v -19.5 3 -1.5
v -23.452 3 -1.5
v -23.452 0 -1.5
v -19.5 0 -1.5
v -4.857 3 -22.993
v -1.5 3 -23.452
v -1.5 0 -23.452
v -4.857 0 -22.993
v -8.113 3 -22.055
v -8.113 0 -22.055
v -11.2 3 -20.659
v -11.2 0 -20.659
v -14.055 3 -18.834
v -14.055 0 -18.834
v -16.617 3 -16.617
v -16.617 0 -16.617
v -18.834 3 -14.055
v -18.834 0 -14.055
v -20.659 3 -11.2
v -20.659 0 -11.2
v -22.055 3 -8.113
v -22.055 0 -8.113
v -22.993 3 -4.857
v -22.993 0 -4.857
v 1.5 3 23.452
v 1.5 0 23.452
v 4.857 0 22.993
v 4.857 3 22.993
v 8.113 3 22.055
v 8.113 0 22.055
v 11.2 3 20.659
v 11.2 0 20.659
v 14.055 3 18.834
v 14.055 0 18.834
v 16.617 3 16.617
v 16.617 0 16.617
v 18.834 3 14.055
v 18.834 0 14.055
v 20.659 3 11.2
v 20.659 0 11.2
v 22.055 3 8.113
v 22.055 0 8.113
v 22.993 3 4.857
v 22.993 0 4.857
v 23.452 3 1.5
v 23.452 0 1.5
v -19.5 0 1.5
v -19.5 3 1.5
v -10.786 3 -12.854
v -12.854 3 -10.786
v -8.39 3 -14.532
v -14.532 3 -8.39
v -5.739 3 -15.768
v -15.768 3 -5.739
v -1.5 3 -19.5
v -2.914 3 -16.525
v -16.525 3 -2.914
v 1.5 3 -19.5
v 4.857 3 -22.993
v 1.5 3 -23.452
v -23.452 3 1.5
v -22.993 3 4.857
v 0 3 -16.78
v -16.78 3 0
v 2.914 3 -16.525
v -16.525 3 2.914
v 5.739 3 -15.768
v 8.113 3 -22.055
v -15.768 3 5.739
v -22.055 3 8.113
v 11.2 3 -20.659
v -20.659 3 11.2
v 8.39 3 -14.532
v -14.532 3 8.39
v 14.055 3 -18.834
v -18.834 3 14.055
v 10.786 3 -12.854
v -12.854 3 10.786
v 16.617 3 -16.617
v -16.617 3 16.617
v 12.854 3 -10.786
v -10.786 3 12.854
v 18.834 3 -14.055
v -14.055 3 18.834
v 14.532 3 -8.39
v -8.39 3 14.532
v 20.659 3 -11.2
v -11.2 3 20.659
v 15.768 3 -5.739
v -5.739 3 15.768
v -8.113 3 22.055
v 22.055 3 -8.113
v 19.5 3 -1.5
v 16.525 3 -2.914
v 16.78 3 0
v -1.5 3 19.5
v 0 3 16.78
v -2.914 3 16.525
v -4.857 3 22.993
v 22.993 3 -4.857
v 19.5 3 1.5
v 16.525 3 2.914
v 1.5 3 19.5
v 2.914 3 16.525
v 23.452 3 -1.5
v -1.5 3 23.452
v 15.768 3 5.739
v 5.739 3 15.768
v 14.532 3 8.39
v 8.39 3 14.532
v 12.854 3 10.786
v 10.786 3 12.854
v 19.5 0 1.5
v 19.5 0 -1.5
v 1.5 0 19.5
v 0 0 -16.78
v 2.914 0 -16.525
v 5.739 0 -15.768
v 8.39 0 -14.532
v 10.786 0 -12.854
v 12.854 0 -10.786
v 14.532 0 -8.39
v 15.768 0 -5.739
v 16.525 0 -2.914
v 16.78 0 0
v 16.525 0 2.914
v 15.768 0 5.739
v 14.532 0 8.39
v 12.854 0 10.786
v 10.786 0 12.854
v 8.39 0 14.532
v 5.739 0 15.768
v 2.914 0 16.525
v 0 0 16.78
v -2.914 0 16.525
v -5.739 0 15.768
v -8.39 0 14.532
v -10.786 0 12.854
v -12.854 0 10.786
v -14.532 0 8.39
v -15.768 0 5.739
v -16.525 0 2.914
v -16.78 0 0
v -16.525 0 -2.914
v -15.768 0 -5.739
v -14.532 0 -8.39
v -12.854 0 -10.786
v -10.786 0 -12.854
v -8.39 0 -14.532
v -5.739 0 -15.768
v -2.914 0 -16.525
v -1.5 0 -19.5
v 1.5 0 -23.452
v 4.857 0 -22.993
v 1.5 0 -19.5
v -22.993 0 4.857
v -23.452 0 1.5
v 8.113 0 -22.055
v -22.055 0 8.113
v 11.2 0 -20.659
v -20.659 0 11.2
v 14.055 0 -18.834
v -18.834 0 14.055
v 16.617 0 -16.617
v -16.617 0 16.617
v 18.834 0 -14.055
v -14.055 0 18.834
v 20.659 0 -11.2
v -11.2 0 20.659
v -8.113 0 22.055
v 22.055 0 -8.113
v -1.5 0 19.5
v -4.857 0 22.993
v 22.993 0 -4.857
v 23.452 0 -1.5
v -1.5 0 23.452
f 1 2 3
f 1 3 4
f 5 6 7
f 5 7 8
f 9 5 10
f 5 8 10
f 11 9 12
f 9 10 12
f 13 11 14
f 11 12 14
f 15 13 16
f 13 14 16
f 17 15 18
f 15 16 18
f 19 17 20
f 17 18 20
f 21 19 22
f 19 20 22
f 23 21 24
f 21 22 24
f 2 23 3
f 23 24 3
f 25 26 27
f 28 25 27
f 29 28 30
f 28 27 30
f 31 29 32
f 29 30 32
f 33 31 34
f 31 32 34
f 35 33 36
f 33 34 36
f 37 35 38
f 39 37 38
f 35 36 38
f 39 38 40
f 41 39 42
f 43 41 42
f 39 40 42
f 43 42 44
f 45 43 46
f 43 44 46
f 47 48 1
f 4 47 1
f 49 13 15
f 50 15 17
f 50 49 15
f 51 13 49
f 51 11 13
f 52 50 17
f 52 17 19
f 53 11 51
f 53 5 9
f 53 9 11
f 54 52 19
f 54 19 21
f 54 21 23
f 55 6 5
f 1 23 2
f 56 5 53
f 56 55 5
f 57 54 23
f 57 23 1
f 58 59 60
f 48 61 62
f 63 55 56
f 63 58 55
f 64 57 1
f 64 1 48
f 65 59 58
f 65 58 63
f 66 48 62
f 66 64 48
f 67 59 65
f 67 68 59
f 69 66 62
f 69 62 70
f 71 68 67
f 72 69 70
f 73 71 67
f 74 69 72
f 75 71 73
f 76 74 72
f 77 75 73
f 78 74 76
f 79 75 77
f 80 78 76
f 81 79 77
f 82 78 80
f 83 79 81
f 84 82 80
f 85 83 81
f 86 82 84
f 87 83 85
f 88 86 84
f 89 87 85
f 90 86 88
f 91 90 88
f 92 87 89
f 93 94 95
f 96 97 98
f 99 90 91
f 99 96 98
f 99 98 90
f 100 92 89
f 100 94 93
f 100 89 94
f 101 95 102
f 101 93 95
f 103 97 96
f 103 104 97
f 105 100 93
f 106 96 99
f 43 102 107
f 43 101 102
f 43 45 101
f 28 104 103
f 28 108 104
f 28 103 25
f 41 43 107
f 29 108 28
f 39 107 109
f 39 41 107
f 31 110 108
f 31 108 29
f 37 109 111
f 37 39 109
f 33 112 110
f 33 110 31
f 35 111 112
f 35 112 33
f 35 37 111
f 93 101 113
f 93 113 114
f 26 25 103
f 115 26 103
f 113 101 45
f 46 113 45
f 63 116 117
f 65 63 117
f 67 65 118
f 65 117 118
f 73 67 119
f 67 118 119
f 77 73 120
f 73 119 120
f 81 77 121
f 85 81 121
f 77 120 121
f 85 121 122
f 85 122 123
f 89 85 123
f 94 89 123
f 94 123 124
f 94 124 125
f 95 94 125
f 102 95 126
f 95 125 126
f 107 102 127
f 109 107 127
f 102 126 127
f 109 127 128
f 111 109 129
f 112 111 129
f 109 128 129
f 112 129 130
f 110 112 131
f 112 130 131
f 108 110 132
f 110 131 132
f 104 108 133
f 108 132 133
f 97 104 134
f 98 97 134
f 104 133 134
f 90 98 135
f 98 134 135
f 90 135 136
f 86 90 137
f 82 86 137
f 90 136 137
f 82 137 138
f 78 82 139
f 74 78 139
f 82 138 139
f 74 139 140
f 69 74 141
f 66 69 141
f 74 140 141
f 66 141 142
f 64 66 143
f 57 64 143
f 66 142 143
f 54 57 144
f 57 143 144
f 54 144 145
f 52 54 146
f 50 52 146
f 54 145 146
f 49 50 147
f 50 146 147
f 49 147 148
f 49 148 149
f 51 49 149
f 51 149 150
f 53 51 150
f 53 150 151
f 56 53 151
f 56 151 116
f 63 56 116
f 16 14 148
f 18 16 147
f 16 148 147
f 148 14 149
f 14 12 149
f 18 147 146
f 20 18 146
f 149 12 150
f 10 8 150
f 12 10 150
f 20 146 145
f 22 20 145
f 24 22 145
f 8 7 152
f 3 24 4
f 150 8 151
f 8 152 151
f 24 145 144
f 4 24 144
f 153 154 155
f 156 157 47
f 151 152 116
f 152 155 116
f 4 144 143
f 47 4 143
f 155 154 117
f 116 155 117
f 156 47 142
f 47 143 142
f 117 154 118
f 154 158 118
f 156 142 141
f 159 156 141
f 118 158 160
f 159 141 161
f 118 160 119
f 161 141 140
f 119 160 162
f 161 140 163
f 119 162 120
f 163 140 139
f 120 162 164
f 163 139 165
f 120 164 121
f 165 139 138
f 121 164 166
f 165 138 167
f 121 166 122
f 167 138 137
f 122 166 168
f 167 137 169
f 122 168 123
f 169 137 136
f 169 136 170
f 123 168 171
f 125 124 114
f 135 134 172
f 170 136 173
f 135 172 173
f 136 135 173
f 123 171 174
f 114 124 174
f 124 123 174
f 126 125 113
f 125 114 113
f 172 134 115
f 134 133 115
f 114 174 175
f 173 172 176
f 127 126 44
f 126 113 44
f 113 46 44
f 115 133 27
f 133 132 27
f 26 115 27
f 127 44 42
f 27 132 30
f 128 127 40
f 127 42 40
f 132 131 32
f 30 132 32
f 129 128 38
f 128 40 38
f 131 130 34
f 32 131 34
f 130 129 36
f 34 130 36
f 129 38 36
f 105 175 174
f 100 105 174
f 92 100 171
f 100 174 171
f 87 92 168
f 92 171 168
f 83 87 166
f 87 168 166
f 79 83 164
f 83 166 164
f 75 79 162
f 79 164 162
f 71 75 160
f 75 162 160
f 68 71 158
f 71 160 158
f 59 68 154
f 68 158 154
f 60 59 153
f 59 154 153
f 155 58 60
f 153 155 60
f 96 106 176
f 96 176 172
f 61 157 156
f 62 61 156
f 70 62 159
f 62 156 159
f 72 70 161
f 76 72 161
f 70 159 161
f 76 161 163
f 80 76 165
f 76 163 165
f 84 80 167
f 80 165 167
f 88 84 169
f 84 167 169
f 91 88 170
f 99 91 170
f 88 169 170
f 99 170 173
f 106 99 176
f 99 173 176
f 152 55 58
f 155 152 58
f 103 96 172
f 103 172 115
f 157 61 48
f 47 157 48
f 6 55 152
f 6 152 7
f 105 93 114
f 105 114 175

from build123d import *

# Parameters (mm, degrees)
SKICA4_R                 = 23.5
P_IDAT_VYSUNUT_M1_DEPTH  = 3
SKICA6_R                 = 16.78
ODEBRAT_VYSUNUT_M2_DEPTH = 3
SKICA7_W                 = 3
SKICA7_H                 = 6.382195619
SKICA7_W_2               = 6.382195619
SKICA7_H_2               = 3
ODEBRAT_VYSUNUT_M3_DEPTH = 3


with BuildPart() as part:
    # Skica4 → Přidat vysunutím1 (new body)
    with BuildSketch(Plane(origin=(0, 0, 0), x_dir=(1, 0, 0), z_dir=(0, 1, 0))):
        with Locations(Location((0, 0, 0), (0, 0, 270))):
            Circle(SKICA4_R)
    extrude(amount=P_IDAT_VYSUNUT_M1_DEPTH)

    # Skica6 → Odebrat vysunutím2 (cut)
    with BuildSketch(Plane.XZ):
        with Locations(Location((0, 0, 0), (0, 0, 270))):
            Circle(SKICA6_R)
    extrude(amount=-ODEBRAT_VYSUNUT_M2_DEPTH, mode=Mode.SUBTRACT)

    # Skica7 → Odebrat vysunutím3 (cut)
    with BuildSketch(Plane(origin=(0, 3, 0), x_dir=(1, 0, 0), z_dir=(0, 1, 0))):
        with Locations((0, -22.69109781)):
            Rectangle(SKICA7_W, SKICA7_H)
        with Locations((22.69109781, 0)):
            Rectangle(SKICA7_W_2, SKICA7_H_2)
        with Locations((-22.69109781, 0)):
            Rectangle(SKICA7_W_2, SKICA7_H_2)
        with Locations((0, 22.69109781)):
            Rectangle(SKICA7_W, SKICA7_H)
    extrude(amount=-ODEBRAT_VYSUNUT_M3_DEPTH, mode=Mode.SUBTRACT)


solid = part.part
